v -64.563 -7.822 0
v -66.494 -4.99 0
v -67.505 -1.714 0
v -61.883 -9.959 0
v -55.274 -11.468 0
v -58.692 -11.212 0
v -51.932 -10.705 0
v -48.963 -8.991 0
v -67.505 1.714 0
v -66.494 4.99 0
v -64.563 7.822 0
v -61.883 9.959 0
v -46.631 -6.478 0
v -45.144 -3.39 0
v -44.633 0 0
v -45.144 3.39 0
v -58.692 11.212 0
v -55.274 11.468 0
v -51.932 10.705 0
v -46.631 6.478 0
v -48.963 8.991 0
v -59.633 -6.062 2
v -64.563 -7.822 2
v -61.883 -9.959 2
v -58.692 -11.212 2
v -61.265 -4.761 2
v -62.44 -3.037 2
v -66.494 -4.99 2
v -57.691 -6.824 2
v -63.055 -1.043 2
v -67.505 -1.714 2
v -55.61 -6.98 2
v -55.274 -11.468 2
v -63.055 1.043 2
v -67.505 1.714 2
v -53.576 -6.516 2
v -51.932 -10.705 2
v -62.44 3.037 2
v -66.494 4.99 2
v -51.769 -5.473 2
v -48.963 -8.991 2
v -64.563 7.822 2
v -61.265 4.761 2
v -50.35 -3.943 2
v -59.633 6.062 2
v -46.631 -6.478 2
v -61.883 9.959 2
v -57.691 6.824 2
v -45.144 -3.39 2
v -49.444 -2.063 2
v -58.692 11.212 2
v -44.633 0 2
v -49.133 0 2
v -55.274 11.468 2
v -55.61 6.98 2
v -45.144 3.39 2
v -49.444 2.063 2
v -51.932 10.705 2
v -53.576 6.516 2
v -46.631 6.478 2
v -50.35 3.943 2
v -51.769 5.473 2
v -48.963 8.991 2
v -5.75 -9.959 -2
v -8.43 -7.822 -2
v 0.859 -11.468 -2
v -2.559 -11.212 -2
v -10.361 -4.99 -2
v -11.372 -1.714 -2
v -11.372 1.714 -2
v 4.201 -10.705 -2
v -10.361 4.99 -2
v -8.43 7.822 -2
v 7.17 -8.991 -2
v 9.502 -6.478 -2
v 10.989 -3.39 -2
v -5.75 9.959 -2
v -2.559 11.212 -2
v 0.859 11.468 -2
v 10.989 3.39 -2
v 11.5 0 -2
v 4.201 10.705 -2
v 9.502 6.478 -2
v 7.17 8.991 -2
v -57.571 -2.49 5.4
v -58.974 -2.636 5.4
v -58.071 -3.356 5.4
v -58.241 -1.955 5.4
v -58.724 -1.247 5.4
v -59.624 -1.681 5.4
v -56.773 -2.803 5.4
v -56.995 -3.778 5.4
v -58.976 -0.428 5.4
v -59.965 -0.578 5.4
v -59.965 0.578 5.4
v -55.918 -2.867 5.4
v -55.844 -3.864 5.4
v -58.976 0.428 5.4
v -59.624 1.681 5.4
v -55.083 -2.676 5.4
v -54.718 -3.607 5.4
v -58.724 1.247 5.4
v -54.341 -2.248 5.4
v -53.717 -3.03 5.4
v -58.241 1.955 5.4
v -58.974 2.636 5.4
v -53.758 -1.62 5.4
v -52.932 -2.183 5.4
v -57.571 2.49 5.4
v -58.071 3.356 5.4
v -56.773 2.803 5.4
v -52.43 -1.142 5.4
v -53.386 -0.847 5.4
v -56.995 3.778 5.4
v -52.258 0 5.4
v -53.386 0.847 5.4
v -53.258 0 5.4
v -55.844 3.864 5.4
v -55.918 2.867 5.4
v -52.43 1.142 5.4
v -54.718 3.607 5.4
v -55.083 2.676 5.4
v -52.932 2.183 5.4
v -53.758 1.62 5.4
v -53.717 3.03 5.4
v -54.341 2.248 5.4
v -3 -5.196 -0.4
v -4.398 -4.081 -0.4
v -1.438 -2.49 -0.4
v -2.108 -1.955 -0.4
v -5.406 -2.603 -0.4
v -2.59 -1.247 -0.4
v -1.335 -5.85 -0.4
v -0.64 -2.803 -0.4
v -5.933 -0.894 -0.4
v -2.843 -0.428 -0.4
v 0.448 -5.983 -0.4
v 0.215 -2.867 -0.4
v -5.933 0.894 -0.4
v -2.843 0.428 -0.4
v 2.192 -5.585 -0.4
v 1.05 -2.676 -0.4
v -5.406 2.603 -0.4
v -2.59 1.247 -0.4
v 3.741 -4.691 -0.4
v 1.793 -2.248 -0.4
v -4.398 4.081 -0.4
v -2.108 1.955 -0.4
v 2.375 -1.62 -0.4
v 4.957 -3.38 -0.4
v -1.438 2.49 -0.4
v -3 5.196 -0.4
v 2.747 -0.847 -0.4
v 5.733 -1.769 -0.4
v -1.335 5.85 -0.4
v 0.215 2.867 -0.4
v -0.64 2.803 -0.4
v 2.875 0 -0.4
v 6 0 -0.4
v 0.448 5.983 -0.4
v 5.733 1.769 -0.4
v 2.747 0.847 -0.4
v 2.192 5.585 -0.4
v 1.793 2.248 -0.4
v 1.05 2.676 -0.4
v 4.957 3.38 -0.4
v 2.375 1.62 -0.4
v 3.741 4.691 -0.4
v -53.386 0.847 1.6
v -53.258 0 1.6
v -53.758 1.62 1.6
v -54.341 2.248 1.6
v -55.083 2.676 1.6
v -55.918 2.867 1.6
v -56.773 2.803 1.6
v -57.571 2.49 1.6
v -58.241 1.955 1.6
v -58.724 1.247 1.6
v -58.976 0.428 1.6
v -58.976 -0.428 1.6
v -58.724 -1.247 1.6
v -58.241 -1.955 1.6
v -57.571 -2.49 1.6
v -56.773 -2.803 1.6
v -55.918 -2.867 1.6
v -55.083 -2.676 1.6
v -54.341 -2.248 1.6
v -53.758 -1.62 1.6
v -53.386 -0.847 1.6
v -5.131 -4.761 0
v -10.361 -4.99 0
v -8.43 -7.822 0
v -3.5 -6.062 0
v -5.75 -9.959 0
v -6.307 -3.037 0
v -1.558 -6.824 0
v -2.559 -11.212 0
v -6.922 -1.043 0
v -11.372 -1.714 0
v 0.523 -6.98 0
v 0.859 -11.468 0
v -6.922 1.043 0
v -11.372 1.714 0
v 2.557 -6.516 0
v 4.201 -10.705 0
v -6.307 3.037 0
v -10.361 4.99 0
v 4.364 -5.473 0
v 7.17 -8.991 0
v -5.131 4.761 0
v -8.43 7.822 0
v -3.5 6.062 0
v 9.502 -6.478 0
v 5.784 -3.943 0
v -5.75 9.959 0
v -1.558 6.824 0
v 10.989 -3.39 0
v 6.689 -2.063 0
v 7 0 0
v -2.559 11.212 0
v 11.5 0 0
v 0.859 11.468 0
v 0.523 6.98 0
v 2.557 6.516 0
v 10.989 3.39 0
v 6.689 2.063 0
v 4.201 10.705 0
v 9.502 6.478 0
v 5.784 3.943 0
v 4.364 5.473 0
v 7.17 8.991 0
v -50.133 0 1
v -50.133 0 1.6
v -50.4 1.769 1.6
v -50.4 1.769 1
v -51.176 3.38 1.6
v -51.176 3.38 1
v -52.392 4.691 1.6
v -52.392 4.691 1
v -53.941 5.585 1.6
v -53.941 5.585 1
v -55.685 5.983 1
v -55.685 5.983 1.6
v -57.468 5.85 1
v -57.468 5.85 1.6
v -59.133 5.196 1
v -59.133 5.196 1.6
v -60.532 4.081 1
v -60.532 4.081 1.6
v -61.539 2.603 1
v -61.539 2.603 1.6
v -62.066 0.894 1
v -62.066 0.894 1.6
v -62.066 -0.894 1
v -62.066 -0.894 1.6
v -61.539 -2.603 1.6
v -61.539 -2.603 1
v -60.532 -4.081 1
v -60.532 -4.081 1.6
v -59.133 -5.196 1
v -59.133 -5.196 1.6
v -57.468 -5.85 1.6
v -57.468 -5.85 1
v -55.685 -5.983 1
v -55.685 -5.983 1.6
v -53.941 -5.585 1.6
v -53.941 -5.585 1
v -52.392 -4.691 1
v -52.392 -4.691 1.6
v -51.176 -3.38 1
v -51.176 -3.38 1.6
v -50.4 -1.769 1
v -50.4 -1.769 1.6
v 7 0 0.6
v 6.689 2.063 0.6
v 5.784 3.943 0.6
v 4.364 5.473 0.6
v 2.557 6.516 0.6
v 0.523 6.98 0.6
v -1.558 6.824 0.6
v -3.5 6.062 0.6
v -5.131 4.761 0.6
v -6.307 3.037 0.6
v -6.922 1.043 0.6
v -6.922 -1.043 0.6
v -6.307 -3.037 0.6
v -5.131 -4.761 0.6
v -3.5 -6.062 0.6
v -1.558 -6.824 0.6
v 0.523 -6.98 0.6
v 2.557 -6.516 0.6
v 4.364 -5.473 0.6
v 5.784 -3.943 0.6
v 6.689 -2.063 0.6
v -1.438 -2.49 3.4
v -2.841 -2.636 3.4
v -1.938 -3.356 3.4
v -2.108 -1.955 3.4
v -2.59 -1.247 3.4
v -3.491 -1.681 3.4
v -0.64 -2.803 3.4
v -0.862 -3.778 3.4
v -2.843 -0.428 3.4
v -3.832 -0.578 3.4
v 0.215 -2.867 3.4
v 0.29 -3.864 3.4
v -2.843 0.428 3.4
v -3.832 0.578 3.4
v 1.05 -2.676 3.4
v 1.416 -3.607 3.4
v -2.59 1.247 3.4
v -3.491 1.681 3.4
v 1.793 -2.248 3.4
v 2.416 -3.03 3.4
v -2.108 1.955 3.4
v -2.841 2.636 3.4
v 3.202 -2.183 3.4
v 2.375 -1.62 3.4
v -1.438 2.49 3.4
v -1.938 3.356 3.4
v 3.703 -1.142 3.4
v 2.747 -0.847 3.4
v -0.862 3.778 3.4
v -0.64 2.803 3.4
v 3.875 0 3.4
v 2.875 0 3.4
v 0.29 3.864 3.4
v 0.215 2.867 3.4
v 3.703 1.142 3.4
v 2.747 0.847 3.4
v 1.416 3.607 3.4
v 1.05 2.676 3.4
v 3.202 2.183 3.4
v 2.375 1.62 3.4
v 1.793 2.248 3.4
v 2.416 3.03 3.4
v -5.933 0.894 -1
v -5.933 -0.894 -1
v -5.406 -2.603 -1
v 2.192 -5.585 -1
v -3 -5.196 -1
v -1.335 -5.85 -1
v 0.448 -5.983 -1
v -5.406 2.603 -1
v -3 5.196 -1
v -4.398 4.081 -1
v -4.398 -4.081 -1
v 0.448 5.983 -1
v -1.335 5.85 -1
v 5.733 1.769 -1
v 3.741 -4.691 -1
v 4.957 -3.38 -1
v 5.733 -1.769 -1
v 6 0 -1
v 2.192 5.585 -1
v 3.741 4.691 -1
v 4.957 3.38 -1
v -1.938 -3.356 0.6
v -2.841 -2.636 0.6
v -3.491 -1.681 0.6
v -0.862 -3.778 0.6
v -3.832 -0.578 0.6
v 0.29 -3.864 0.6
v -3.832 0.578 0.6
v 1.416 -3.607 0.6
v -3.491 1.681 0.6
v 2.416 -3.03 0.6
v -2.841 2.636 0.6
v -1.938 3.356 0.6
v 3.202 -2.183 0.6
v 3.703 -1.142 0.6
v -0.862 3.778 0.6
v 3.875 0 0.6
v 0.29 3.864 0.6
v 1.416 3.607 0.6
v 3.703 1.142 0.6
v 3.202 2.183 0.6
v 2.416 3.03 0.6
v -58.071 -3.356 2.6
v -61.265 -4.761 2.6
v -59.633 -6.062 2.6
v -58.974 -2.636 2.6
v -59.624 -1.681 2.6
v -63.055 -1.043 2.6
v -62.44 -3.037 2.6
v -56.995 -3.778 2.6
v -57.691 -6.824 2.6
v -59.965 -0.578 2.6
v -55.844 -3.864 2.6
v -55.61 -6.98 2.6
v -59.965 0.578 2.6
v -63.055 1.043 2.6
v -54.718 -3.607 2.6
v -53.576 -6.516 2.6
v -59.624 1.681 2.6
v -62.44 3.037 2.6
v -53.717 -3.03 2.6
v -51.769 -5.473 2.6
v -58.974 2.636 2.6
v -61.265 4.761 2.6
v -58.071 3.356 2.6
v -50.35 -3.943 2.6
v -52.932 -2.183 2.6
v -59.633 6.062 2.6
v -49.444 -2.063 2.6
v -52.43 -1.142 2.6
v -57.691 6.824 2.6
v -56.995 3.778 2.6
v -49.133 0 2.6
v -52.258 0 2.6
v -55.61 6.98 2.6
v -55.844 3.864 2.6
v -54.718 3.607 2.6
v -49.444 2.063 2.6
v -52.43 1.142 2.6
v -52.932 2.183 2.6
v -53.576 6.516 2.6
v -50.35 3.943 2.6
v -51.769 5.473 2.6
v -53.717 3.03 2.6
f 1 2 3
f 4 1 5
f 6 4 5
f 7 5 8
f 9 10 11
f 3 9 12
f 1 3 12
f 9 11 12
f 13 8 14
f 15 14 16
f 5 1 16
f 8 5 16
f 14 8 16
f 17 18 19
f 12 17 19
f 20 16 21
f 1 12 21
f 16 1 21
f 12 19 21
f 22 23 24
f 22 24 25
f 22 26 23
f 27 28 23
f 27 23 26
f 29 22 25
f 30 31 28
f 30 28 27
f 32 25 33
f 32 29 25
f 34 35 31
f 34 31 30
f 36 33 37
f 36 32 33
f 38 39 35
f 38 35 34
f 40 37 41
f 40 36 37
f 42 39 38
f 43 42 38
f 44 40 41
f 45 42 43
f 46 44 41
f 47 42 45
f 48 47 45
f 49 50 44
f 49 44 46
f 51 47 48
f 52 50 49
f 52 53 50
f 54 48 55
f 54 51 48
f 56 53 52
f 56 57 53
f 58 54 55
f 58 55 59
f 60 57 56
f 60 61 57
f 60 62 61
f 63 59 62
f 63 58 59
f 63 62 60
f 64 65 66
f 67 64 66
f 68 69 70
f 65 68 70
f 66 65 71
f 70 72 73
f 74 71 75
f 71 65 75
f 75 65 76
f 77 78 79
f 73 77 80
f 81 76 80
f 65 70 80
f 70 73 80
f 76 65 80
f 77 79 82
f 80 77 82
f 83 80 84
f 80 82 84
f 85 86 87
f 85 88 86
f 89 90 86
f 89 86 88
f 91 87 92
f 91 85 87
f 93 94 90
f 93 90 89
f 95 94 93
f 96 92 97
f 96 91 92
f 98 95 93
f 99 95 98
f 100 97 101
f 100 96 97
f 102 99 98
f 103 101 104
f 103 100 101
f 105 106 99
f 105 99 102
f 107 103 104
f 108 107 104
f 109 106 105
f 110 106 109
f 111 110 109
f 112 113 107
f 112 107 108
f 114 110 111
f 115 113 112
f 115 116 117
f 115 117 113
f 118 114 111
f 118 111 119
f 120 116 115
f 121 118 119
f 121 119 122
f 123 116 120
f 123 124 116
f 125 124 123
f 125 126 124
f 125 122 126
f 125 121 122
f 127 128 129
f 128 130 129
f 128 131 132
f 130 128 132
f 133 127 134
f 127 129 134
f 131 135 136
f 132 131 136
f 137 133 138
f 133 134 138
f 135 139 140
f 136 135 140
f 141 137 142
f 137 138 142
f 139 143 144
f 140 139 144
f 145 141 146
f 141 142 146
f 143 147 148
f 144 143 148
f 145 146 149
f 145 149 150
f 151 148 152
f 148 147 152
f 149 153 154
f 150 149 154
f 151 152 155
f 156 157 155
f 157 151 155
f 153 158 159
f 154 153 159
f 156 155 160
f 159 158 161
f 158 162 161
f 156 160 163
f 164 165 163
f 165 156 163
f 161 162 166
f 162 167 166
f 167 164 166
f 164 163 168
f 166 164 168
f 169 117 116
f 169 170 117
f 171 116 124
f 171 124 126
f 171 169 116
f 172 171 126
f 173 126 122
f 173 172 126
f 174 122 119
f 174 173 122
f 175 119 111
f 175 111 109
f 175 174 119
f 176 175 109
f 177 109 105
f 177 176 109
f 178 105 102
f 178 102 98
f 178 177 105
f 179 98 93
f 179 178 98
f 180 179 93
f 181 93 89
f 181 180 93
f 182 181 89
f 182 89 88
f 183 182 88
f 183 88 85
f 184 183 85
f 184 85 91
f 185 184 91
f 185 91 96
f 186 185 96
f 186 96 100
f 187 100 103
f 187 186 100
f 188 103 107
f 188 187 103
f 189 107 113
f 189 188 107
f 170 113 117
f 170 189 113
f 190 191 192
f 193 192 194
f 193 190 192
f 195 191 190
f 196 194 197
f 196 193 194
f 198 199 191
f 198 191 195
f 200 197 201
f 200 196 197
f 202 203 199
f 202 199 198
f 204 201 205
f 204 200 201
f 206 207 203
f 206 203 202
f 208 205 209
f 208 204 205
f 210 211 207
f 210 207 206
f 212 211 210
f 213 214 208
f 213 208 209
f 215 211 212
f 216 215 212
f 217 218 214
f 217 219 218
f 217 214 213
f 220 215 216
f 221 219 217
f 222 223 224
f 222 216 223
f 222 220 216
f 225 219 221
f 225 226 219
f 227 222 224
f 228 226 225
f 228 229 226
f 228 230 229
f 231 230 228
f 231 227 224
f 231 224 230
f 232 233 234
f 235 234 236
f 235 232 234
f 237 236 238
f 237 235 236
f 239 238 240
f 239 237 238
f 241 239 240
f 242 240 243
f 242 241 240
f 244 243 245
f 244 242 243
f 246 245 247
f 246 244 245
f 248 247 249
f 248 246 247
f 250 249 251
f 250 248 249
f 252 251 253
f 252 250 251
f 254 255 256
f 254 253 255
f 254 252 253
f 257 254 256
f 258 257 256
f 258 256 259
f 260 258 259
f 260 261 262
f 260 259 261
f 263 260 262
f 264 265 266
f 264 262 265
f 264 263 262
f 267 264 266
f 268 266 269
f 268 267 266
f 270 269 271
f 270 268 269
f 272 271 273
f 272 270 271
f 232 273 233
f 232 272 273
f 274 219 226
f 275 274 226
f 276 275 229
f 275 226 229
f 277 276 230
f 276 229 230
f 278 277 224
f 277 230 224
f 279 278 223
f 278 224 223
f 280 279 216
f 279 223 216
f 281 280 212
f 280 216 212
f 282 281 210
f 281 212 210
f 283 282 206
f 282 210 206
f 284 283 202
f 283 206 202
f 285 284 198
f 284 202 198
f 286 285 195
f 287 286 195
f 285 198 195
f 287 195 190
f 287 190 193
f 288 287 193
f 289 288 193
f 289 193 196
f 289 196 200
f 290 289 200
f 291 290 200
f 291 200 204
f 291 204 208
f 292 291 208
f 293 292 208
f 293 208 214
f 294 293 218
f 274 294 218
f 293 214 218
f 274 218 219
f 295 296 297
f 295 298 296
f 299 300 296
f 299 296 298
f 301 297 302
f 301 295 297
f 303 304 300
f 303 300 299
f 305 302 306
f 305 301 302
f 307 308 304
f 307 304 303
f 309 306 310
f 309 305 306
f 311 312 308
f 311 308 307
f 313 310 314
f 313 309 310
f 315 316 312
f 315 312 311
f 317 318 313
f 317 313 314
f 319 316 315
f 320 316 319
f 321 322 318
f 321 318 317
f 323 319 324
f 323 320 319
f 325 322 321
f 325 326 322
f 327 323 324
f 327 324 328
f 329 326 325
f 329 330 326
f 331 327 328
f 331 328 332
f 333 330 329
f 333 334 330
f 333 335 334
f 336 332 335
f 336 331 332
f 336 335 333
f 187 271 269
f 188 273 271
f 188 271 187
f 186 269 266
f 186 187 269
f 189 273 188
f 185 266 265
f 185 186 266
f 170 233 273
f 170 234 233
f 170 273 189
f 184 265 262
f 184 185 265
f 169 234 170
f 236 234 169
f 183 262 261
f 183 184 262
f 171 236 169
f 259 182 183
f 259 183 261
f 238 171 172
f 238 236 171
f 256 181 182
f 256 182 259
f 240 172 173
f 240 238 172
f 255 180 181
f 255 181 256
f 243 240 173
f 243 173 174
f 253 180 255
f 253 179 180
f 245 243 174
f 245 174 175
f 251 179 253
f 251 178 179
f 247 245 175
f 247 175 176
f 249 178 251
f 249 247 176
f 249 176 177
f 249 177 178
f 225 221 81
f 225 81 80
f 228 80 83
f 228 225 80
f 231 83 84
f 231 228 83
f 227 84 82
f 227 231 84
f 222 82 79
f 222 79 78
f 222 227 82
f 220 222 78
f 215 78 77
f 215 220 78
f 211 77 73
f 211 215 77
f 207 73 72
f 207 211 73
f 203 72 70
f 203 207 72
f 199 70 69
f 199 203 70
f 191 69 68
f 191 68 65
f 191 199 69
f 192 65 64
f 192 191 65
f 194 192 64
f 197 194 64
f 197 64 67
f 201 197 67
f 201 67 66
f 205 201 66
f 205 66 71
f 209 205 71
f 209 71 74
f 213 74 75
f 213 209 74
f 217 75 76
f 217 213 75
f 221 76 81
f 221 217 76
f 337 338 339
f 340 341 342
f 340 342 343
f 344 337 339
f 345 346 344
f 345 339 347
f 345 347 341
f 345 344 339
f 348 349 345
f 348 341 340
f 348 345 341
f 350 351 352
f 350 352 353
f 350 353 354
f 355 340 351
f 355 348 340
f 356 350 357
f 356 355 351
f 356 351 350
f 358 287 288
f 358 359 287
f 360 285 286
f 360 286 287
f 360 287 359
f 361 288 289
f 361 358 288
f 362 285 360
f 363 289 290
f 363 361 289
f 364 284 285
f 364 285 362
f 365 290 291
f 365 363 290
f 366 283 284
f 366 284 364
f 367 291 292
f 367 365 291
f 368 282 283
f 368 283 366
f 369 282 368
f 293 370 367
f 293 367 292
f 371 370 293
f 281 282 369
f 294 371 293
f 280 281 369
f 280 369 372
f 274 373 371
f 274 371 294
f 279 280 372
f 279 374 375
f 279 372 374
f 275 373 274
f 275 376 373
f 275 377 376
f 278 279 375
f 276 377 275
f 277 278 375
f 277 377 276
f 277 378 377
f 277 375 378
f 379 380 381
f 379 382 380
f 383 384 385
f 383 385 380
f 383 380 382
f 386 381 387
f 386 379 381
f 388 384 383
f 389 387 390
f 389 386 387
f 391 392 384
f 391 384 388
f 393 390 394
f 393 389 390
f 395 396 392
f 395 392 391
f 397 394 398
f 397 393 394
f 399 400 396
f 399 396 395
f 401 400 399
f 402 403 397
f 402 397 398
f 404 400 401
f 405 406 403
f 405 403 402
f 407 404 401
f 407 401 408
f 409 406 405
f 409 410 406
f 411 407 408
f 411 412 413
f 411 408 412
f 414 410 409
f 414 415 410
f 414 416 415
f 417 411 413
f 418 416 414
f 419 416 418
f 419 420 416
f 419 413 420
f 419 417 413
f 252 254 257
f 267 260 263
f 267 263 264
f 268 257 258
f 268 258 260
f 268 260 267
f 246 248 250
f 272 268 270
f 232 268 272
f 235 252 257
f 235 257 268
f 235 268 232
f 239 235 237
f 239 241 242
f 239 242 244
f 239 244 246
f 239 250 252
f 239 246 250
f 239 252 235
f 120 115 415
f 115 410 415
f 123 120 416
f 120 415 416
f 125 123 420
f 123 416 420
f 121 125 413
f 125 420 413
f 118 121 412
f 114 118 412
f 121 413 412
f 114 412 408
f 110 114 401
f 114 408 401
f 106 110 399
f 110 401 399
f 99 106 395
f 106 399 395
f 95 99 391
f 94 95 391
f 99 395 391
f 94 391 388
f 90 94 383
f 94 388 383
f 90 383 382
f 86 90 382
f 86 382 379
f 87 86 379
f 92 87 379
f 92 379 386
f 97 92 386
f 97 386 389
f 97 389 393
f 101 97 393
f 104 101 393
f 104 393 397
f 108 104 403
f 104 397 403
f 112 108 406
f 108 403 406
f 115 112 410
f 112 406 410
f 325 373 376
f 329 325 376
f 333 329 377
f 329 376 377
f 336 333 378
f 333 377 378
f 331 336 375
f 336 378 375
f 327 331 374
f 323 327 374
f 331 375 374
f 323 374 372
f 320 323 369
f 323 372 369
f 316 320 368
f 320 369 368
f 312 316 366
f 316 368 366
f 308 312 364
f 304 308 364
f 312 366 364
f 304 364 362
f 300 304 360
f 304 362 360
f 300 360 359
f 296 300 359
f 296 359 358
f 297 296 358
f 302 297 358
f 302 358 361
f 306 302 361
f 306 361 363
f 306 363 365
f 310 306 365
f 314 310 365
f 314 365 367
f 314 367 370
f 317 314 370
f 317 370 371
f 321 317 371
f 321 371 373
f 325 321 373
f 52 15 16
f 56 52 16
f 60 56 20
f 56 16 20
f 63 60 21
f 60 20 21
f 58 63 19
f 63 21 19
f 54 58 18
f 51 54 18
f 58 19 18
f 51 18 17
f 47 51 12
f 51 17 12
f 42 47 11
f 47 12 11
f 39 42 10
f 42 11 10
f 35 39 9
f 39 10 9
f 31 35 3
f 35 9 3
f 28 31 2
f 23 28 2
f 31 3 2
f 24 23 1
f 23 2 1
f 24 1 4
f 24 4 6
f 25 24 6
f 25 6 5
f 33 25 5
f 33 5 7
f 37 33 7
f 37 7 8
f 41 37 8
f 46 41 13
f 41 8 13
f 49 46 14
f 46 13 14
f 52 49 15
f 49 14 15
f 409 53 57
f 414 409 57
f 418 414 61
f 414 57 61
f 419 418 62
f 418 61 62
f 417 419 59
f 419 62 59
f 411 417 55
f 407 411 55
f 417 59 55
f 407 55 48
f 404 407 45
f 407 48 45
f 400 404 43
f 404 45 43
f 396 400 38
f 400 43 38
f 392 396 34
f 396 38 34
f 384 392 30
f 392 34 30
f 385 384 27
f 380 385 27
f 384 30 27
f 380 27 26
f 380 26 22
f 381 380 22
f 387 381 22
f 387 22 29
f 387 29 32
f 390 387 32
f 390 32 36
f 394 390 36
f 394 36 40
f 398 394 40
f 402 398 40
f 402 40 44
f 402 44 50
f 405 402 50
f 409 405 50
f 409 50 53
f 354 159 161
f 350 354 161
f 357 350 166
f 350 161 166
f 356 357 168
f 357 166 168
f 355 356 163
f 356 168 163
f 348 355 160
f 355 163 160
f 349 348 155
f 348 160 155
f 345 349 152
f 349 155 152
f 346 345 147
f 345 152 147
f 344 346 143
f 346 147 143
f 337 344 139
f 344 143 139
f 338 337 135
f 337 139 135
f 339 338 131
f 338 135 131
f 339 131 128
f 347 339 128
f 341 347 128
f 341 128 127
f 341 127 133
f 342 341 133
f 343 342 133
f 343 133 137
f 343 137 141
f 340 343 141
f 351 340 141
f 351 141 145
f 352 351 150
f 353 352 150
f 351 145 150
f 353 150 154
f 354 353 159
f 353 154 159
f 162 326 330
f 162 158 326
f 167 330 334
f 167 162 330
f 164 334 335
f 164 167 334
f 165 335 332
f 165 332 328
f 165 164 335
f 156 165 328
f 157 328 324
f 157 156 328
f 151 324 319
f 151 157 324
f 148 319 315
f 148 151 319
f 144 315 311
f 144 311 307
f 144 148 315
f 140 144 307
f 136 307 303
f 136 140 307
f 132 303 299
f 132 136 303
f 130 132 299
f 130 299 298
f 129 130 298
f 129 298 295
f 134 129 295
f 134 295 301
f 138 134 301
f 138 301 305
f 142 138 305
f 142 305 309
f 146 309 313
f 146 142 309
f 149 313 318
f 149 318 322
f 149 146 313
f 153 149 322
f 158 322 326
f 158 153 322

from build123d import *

# Parameters (mm, degrees)
F0_R        = 3.875
F1_DEPTH    = 3.4
F0_R_2      = 7
F2_DEPTH    = 0.6
F0_R_3      = 11.5
F3_DEPTH    = 2
F4_T        = 1
F5_R        = 3.875
F6_DEPTH    = 3.4
F5_R_2      = 7
F7_DEPTH    = 0.6
F6_FACE_R   = 3.875
F7_FACE_R   = 7
F7_FACE_R_2 = 3.875
F5_R_3      = 11.5
F8_DEPTH    = 2
F9_T        = 1


# Not quite as in the source:
# - a shell that OpenCascade refuses in one call is made with other operations: the cavity is built on its own and cut out


with BuildPart() as f1:
    # F0 (on Top) → F1 (new body)
    with BuildSketch(Plane.XY):
        Circle(F0_R)
    extrude(amount=F1_DEPTH)

    # F0 (on Top) → F2 (join)
    with BuildSketch(Plane.XY):
        Circle(F0_R_2)
        Circle(F0_R, mode=Mode.SUBTRACT)
    extrude(amount=F2_DEPTH)

    # F0 (on Top) → F3 (join)
    with BuildSketch(Plane.XY):
        Circle(F0_R_3)
        Circle(F0_R_2, mode=Mode.SUBTRACT)
        Circle(F0_R_2)
        Circle(F0_R, mode=Mode.SUBTRACT)
        Circle(F0_R)
    extrude(amount=-F3_DEPTH)

    # F4: shell of thickness 1, made by hand


with BuildPart() as f4_core1:
    # F4_t2: copy of F1
    add(f1.part)

    # the walls: a layer under each face that stays
    f4_faces = [f4_core1.faces().sort_by_distance(p)[0] for p in [
        (-11.5, 0, -1),
        (-7.6666666667, -7.6666666667, 0),
        (0, 0, -2),
        (-7, 0, 0.3),
        (-4.6666666667, -4.6666666667, 0.6),
        (-3.875, 0, 2),
    ]]
    thicken(f4_faces, amount=-F4_T, mode=Mode.SUBTRACT)

    # F4_s3 → F4_t4 (revolve, cut)
    with BuildSketch(Plane.XZ):
        Polygon((7.01, 0.01), (7, -1), (6, -1), (6, 0), align=None)
    revolve(axis=Axis((0, 0, 0), (0, 0, 1)), mode=Mode.SUBTRACT)

    # F4_s5 → F4_t6 (revolve, cut)
    with BuildSketch(Plane.XZ):
        Polygon((3.885, 0.61), (3.875, -0.4), (2.875, -0.4), (2.875, 0.6), align=None)
    revolve(axis=Axis((0, 0, 0.6), (0, 0, 1)), mode=Mode.SUBTRACT)


with BuildPart() as f1_1:
    add(f1.part)

    # what is left inside the walls is the cavity
    f4_cavity = [f4_core1.part.solids().sort_by_distance(p)[0] for p in [
        (0, -2, -0.99),
    ]]
    add(f4_cavity, mode=Mode.SUBTRACT)


with BuildPart() as f6:
    # F5 (on Top) → F6 (new body)
    with BuildSketch(Plane.XY):
        with Locations((-56.1332218349, 0)):
            Circle(F5_R)
    extrude(amount=F6_DEPTH)

    # F5 (on Top) → F7 (join)
    with BuildSketch(Plane.XY):
        with Locations((-56.1332218349, 0)):
            Circle(F5_R_2)
        with Locations((-56.1332218349, 0)):
            Circle(F5_R, mode=Mode.SUBTRACT)
    extrude(amount=F7_DEPTH)

    # F6_face (on face) + F7_face (on face) + F5 (on Top) → F8 (join)
    with BuildSketch(Plane(origin=(-56.1332218349, 0, 3.4), x_dir=(1, 0, 0), z_dir=(0, 0, 1))):
        Circle(F6_FACE_R)
    with BuildSketch(Plane(origin=(-56.1332218349, 0, 0.6), x_dir=(1, 0, 0), z_dir=(0, 0, 1))):
        Circle(F7_FACE_R)
        Circle(F7_FACE_R_2, mode=Mode.SUBTRACT)
    with BuildSketch(Plane.XY):
        with Locations((-56.1332218349, 0)):
            Circle(F5_R_3)
        with Locations((-56.1332218349, 0)):
            Circle(F5_R_2, mode=Mode.SUBTRACT)
    extrude(amount=F8_DEPTH)

    # F9: shell of thickness 1, made by hand


with BuildPart() as f9_core1:
    # F9_t2: copy of F6
    add(f6.part)

    # the walls: a layer under each face that stays
    f9_faces = [f9_core1.faces().sort_by_distance(p)[0] for p in [
        (-60.0082218349, 0, 4),
        (-60.7998885016, -4.6666666667, 2.6),
        (-63.1332218349, 0, 2.3),
        (-63.7998885016, -7.6666666667, 2),
        (-67.6332218349, 0, 1),
        (-56.1332218349, 0, 0),
    ]]
    thicken(f9_faces, amount=-F9_T, mode=Mode.SUBTRACT)

    # F9_s3 → F9_t4 (revolve, cut)
    with BuildSketch(Plane.XZ):
        Polygon((-52.2482218349, 2.61), (-53.2582218349, 2.6), (-53.2582218349, 1.6), (-52.2582218349, 1.6), align=None)
    revolve(axis=Axis((-56.1332218349, 0, 2.6), (0, 0, 1)), mode=Mode.SUBTRACT)

    # F9_s5 → F9_t6 (revolve, cut)
    with BuildSketch(Plane.XZ):
        Polygon((-49.1232218349, 2.01), (-50.1332218349, 2), (-50.1332218349, 1), (-49.1332218349, 1), align=None)
    revolve(axis=Axis((-56.1332218349, 0, 2), (0, 0, 1)), mode=Mode.SUBTRACT)


with BuildPart() as f6_1:
    add(f6.part)

    # what is left inside the walls is the cavity
    f9_cavity = [f9_core1.part.solids().sort_by_distance(p)[0] for p in [
        (-56.133222, -2, 1.01),
    ]]
    add(f9_cavity, mode=Mode.SUBTRACT)


solid = Compound([f1_1.part, f6_1.part])
